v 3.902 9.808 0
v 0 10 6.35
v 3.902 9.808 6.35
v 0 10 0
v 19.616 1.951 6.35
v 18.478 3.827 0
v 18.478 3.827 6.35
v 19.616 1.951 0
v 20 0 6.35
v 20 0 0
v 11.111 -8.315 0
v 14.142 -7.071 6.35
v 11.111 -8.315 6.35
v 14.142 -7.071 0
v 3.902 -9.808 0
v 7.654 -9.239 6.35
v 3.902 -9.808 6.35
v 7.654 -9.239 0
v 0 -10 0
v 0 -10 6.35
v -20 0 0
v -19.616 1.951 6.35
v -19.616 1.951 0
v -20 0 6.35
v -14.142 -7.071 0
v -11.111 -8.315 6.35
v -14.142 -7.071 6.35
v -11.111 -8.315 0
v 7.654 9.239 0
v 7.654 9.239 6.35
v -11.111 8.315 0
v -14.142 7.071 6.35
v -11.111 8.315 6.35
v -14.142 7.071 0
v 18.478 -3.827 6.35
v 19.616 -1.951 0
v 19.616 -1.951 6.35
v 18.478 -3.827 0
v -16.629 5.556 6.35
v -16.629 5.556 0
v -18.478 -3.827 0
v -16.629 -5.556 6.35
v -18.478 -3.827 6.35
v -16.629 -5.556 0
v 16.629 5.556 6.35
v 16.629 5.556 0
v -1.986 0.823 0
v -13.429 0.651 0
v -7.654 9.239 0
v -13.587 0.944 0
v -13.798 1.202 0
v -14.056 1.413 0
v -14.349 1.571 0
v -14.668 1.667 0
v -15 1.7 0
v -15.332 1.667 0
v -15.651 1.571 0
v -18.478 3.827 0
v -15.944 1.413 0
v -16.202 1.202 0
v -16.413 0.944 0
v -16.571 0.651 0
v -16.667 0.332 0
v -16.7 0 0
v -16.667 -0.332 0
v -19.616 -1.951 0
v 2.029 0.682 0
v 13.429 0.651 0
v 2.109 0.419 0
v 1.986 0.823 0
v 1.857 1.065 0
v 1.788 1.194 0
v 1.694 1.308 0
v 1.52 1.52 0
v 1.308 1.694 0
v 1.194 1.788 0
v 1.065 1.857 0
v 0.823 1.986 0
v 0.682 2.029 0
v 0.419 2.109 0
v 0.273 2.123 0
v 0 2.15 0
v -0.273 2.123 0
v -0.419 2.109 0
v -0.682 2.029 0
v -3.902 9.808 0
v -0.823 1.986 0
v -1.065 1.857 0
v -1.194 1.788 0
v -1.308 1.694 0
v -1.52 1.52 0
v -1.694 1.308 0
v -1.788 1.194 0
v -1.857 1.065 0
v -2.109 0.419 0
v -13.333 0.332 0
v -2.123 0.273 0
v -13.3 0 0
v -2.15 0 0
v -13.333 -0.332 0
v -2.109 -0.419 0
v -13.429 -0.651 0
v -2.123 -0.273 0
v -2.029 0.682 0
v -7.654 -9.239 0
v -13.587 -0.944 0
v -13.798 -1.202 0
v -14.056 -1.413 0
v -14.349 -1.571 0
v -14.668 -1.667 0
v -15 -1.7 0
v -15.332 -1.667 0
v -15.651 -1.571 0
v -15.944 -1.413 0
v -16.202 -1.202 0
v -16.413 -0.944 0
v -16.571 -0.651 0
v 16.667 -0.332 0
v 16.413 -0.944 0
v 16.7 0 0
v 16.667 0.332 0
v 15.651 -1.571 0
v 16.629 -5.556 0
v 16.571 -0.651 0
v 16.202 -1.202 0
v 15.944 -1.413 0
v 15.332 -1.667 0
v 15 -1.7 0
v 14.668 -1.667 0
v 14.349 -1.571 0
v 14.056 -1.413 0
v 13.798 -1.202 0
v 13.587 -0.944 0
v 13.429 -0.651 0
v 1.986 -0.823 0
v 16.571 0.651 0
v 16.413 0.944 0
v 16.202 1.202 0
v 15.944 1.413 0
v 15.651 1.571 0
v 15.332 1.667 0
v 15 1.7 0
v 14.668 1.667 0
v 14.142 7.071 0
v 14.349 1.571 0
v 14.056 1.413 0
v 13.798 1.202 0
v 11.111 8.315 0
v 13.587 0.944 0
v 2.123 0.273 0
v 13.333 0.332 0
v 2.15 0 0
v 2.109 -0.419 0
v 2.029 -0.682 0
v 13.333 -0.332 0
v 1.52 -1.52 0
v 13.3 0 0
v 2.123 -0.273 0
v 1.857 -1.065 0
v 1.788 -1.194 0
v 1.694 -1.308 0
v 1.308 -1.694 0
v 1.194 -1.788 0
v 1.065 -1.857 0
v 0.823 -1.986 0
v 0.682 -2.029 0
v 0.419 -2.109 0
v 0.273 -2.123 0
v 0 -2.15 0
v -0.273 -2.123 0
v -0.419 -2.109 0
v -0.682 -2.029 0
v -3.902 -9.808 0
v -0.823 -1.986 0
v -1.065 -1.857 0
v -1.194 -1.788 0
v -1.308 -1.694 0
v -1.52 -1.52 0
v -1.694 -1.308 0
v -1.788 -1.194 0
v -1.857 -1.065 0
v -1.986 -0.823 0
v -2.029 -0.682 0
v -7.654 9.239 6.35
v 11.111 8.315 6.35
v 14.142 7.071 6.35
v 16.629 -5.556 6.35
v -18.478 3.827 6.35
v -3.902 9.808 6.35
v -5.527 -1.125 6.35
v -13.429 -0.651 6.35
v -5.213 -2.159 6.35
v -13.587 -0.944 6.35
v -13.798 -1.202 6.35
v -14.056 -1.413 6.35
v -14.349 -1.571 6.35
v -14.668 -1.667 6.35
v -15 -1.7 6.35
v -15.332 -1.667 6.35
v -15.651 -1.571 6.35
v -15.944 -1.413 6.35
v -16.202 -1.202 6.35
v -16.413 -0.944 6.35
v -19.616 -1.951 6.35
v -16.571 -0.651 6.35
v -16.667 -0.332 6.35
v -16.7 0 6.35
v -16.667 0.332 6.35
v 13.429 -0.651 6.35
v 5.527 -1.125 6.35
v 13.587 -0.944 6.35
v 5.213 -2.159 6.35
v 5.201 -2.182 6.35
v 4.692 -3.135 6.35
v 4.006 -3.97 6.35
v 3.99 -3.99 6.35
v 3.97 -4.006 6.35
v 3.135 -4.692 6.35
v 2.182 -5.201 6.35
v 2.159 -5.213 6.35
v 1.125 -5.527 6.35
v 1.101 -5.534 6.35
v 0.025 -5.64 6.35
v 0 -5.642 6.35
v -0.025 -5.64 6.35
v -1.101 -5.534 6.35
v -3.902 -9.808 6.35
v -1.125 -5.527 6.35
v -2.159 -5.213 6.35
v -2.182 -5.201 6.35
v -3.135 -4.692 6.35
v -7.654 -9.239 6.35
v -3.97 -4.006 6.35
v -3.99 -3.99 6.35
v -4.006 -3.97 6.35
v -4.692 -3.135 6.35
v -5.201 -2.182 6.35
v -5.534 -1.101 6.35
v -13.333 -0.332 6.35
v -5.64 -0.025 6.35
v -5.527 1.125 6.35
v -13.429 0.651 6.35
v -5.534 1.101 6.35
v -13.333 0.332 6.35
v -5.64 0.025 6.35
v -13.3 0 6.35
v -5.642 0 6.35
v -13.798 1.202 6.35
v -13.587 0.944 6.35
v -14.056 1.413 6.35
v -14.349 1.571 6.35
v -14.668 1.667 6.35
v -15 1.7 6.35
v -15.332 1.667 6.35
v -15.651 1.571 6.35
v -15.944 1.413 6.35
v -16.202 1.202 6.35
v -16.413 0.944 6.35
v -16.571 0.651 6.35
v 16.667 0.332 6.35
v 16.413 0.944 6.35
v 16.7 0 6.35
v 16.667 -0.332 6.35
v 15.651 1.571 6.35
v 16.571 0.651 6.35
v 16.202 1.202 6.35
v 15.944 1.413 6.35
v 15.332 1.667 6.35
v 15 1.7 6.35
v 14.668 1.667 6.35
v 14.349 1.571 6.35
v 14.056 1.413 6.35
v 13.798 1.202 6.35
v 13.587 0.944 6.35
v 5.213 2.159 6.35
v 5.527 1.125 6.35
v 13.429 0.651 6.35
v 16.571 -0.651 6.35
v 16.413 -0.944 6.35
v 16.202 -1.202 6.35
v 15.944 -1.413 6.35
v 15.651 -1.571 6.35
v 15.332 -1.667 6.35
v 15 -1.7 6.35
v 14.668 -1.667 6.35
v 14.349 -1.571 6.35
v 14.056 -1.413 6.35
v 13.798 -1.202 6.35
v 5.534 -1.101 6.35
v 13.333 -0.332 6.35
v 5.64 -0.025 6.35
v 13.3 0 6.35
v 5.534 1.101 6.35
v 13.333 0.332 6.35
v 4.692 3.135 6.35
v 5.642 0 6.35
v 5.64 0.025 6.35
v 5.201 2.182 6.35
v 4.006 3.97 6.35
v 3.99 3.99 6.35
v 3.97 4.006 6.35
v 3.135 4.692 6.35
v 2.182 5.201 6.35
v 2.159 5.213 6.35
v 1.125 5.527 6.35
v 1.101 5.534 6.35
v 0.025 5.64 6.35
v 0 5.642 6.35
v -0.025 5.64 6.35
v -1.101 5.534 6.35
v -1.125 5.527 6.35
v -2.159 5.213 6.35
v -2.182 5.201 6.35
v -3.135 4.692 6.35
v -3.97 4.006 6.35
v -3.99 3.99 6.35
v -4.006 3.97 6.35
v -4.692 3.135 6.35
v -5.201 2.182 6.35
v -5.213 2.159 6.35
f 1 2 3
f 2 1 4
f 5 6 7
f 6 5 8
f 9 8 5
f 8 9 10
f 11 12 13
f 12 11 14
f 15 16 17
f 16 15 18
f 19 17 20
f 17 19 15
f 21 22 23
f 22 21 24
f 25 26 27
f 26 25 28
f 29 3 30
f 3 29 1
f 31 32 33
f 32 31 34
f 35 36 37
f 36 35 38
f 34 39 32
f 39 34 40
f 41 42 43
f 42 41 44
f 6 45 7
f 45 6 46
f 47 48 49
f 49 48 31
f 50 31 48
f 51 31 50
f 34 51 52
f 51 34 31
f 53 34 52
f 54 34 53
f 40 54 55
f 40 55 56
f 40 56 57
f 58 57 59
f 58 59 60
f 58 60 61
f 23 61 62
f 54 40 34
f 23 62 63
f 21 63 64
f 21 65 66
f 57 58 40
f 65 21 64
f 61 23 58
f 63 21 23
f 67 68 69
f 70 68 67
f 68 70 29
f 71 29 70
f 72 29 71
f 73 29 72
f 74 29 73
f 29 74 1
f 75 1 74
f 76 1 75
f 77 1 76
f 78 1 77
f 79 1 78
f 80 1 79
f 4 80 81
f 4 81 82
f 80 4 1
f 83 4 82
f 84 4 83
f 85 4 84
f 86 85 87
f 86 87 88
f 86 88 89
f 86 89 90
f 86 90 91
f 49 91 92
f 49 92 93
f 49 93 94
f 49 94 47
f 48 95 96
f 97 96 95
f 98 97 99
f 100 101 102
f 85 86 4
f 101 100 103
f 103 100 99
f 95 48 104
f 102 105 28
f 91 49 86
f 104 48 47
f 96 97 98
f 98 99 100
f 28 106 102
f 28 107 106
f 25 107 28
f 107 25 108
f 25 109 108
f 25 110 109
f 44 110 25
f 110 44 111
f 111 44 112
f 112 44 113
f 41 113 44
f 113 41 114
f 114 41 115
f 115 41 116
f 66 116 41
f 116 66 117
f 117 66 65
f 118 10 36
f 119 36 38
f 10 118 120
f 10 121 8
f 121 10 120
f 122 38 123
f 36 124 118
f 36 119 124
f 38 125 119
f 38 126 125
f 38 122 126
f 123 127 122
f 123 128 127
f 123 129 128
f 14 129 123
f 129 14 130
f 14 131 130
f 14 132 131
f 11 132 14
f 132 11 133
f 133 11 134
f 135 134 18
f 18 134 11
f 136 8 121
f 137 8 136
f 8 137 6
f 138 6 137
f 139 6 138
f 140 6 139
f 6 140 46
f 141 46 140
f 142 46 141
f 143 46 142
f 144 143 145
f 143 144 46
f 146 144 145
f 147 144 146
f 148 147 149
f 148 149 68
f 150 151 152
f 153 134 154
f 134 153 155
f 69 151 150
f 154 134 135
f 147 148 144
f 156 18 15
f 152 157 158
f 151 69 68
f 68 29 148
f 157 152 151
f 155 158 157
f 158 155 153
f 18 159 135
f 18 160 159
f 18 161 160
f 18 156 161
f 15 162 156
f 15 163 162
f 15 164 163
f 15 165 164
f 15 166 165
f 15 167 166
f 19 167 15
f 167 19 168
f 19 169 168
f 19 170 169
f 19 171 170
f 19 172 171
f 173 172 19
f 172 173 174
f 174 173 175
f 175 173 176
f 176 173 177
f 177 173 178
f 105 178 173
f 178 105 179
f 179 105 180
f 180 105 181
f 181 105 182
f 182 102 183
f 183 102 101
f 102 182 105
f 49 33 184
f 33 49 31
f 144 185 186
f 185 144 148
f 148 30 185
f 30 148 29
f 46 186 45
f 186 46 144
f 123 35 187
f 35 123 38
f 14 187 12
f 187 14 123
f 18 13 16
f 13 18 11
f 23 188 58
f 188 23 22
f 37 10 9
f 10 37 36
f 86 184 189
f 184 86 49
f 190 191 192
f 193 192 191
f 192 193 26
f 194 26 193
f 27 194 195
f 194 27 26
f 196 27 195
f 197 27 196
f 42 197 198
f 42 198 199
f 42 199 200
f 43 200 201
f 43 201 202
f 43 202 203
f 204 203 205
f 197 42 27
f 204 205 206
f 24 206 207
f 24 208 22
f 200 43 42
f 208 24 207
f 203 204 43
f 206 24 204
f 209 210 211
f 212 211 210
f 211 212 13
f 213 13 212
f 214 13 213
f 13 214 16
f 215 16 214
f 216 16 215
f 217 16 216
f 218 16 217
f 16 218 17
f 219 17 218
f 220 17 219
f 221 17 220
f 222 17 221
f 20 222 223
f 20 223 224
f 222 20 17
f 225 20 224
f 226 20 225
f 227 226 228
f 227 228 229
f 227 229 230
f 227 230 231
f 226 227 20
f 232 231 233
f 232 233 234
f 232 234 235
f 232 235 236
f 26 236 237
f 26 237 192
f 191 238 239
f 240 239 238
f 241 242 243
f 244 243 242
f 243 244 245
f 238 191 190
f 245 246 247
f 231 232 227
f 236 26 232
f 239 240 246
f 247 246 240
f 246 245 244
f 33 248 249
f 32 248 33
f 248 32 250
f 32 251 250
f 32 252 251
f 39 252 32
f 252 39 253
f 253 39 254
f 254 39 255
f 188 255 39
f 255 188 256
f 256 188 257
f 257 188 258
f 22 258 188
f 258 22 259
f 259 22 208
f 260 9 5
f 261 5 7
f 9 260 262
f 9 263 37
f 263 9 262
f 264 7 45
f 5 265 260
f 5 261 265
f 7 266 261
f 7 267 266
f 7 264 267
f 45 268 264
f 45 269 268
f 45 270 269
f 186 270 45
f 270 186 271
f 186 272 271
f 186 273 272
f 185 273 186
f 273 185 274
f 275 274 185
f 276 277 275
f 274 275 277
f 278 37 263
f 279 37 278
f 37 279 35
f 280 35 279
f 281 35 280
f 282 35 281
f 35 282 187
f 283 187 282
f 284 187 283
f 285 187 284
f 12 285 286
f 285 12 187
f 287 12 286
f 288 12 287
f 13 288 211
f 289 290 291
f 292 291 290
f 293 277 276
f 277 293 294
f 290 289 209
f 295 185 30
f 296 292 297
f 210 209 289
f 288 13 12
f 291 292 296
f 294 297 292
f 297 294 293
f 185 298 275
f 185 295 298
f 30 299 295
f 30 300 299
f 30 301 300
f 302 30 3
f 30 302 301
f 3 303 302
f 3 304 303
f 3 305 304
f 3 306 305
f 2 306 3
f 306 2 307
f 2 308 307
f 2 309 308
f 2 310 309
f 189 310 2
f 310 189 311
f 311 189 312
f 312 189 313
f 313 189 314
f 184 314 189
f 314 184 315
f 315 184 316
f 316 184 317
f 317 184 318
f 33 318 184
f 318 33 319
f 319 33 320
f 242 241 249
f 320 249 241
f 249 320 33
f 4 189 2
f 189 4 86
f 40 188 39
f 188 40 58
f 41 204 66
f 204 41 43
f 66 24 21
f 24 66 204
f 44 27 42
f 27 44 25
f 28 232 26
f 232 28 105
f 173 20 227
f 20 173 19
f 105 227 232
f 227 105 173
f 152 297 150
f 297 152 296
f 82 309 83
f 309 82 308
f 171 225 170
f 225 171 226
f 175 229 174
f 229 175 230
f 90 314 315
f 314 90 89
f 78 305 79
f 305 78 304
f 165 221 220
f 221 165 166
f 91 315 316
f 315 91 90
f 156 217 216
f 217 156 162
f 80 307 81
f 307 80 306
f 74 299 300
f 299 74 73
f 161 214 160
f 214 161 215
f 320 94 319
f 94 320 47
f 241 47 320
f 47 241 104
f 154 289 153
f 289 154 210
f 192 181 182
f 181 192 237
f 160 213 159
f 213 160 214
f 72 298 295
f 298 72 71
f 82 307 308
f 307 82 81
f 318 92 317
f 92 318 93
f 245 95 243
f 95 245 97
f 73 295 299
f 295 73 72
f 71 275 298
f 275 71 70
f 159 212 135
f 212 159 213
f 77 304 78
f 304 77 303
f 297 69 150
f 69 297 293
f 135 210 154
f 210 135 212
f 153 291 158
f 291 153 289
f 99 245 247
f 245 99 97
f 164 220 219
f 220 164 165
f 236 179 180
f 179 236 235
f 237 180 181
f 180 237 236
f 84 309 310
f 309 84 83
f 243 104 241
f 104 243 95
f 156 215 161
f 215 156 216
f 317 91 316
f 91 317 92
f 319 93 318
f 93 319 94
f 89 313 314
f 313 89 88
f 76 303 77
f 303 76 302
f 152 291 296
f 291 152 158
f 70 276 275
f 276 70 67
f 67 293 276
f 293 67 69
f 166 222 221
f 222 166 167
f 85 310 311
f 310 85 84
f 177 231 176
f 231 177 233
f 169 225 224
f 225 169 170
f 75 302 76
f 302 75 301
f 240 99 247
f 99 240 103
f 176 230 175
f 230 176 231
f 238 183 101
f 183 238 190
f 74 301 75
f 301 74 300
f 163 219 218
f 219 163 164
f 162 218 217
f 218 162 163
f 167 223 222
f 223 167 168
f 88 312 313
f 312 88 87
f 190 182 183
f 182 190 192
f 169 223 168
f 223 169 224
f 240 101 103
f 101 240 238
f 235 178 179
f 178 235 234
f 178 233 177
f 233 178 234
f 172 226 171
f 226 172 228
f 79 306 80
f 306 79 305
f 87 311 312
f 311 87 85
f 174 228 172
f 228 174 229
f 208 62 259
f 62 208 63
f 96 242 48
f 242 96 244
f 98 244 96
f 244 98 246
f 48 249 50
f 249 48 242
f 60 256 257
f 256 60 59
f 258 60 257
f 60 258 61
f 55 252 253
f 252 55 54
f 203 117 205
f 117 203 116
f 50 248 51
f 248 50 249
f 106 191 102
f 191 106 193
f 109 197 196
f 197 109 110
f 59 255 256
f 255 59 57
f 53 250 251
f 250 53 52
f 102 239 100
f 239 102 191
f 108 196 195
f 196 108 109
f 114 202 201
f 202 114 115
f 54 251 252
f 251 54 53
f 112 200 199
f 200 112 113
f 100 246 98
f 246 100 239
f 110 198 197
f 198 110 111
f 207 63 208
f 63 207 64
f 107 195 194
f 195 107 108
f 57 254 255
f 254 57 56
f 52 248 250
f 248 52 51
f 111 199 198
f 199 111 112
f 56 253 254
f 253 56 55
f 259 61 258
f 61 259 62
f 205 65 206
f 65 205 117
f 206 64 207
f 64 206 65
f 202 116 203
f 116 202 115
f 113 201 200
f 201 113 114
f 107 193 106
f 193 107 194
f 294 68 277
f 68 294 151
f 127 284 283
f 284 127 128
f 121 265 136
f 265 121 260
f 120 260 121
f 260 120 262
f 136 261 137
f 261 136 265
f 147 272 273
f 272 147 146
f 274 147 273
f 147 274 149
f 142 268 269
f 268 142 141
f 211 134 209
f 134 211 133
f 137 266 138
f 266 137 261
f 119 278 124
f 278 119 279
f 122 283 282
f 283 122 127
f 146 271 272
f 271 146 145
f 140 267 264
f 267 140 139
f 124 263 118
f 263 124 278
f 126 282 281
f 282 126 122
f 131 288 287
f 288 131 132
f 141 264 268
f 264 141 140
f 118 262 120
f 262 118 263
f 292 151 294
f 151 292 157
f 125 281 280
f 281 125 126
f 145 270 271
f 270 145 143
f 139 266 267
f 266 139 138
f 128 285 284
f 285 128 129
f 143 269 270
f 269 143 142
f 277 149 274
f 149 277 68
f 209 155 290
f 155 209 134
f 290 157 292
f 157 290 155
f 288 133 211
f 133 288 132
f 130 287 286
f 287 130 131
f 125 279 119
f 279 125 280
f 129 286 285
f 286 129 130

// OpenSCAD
// file: OpenSampler_v5_CONFIG_v0p0.scad
in=25.4;
xs=20;

Lx=440; //was 590 in Opensampler V2,was 480 in Opensampler V3.03
Ly=285;	//was 380 in OpenSampler V2,was 315 in OpenSampler V3.03
Lz=240; // was 220 in Opensampler V2, was 200 in Opensampler V3.03
La=135; //length of moving part on z-axis, was 140 in Opensampler V3.03
LyPlate=169; // length of y-plate that z-axis moves on. was 169 in V3.10

nema17holespac=31;
nema17diagholespac=43.84;

xyarm=28;
zyarm=Lz+xs+6;

platethick=3.175;
backpanelthick=6.35;
frontpanelthick=6;
bottomthick=12.7;
belt_end_thick=4.8;

wheeloffset=12;
plateoffset=wheeloffset-10;

//distance from extrusion surface to bottom plate=2.2mm
// plates are about 2.8mm making plate surface 5mm of extrusion
//hole spacing for wheels: 40.64,60.64,80.64,100.64
// BETTER hole spacing for wheels: 40.0,60.0,80.0,100.0
// hole diam for fixed wheel:5mm, for eccentric: 7.14mm
// spacer block and acme block are 12mm thick.
// 125ml (100ml) bottle size: h=95mm, diam=52mm

// 60mm clearance for needle and spings etc.
// so height between bottom frame and bottom z-axis:
// trayplate thickness + bottle h + 60
// 13 + 108 + 60 = 188mm

// tallest bottle: 155, smallest bottle: 105
// minimum clearance: 10, spring action: 40
// vertical movement: 155-105+10+30=90


// FOR OpenSampler V4 
// more z-height, 155mm 16mm diam vials expected
// ordered vials of KIMAX 16*150mm, which are 155mm high with cap
// change y cart to have 6 mini wheels for Z-axis
// fit 3 trays of 5*8 (103*160mm, 19mm spacing, 4mm edge)
// main file
include <OpenSampler_v5_CONFIG_v0p0.scad>;
$fn=32;


module E1x1(len){
	translate([0,0,0])
	difference(){
		translate([-xs/2,-xs/2,0])
		cube([xs,xs,len]);
		for ( i = [0 : 3] ){
			rotate([0,0,i*90])
			translate([-xs/2-1,-xs/8,-1])
			cube([xs/4,xs/4,len+2]);
		}
		translate([0,0,-1])
		cylinder(r=2.5,h=len+2);
	}	
}

module E1x2(len){
	translate([0,-xs*1/2,0]){
		E1x1(len);
		translate([0,xs,0])
		E1x1(len);
	}
}

module E1x3(len){
	translate([0,-xs*1,0]){
		E1x1(len);
		translate([0,xs,0])
		E1x1(len);
		translate([0,xs*2,0])
		E1x1(len);
	}
}

module wheel(){
	difference(){
		cylinder(r=12,h=11,center=true,$fn=25);
		cylinder(r=2.5,h=12,center=true);
	}
}

module mini_wheel(){
	difference(){
		cylinder(r=7.65,h=10,center=true);
		cylinder(r=2.5,h=12,center=true);
	}
}

// stepper nema 17, with some extra space around
module stepper(){ 
	difference(){
		union(){
			translate([-21,-21,-40])	
				cube([42,42,40],center=false);
			cylinder(r=2.5,h=30,center=false);
			cylinder(r=12,h=4,center=true);
			translate([-15.5,-15.5,0])
				cylinder(r=1.5,h=10,center=false);
			translate([15.5,-15.5,0])
				cylinder(r=1.5,h=10,center=false);
			translate([15.5,15.5,0])
				cylinder(r=1.5,h=10,center=false);
			translate([-15.5,15.5,0])
				cylinder(r=1.5,h=10,center=false);

			translate([0,0,10])
				cylinder(r=8,h=15,center=false);				
		}
	}
}

// stepper nema 17, with TR8-2 rod
module z_stepper(len){ 
	difference(){
		union(){
			translate([-21,-21,-40])	
				cube([42,42,40],center=false);
			cylinder(r=2.5,h=30,center=false);
			cylinder(r=12,h=4,center=true);
			translate([-15.5,-15.5,0])
				cylinder(r=1.5,h=10,center=false);
			translate([15.5,-15.5,0])
				cylinder(r=1.5,h=10,center=false);
			translate([15.5,15.5,0])
				cylinder(r=1.5,h=10,center=false);
			translate([-15.5,15.5,0])
				cylinder(r=1.5,h=10,center=false);
			translate([0,0,0])
				cylinder(r=4,h=len,center=false);					
		}
	}
}


module stepper_holes(){ 
	difference(){
		union(){
			translate([-21.5,-21.5,-49])	
				cube([43,43,49],center=false);
			cylinder(r=2.5,h=70,center=true);
			cylinder(r=14,h=10,center=false);
			cylinder(r=6,h=35,center=false);
			translate([-15.5,-15.5,0])
				cylinder(r=2,h=80,center=true);
			translate([15.5,-15.5,0])
				cylinder(r=2,h=80,center=true);
			translate([15.5,15.5,0])
				cylinder(r=2,h=80,center=true);
			translate([-15.5,15.5,0])
				cylinder(r=2,h=80,center=true);
		
		}
	}
}

// Main plate for x-axis movement 4.8mm aluminum (3/16")
module x_plate_top(){
	difference(){
		union(){
			translate([-5,-37,0])
			cube([115,76,4.8]);

			translate([(104+51.5)/2-21,35-24,0])
			cube([42,42,4.8]);				
            
            // wheels are just for display
			translate([2,-30,-12])
			wheel();
			translate([54,-30,-12])
			wheel();
			translate([104,-30,-12])
			wheel();

			translate([2,30,-12])
			wheel();
			translate([49,30,-12])
			wheel();
			translate([104,30,-12])
			wheel();
		}
        // holes for adjustable wheels
		translate([2,-30,-1])
		cylinder(r=3.57,h=10);
		translate([54,-30,-1])
		cylinder(r=3.57,h=10);
		translate([104,-30,-1])
		cylinder(r=3.57,h=10);

        // holes for M5 thread for wheels
		translate([2,30,-1])
		cylinder(r=2.1,h=10);
		translate([49,30,-1])
		cylinder(r=2.1,h=10);
		translate([104,30,-1])
		cylinder(r=2.1,h=10);

        // holes for attachment y-arm
		translate([xyarm,0,-1]){
			translate([0,30,0])
			cylinder(r=2.5,h=10);
			translate([0,0,0])
			cylinder(r=2.5,h=10);
			translate([0,-25,0])
			cylinder(r=2.5,h=10);
		}
        // pocket for secure attachment of y-arm
		translate([xyarm,0,0])        
        translate([-10,-50,3.2])
        cube([20,100,10]);

        // holes for 20mm endstop switch
		translate([2,-3,-1]){
			translate([0,-4.75,0])
			cylinder(r=1.2,h=10);
			translate([0,4.75,0])
			cylinder(r=1.2,h=10);
		}
        // holes for stepper motor
        translate([(104+51.5)/2,32,4.8+0.1])
        rotate([0,180,0])
        stepper_holes();

	}
	
}



module y_plate_top(){
	difference(){
		union(){
			translate([-36,-32,0])
			cube([LyPlate,64,platethick]);
			translate([-30,-20,-12])
			wheel();
			translate([30,-26,-12])
			wheel();
			translate([-30,26,-12])
			wheel();
			translate([30,26,-12])
			wheel();

			translate([50,25.7,15])
			mini_wheel();
			translate([50,-25.7,15])
			mini_wheel();
			translate([-25,-25,0])
			cube([50,50,3]);
			translate([17,25.7,15])
			mini_wheel();
			translate([17,-25.7,15])
			mini_wheel();
			translate([-16,25.7,15])
			mini_wheel();
			translate([-16,-25.7,15])
			mini_wheel();



		}
		translate([60,0,-1])
		cylinder(r=2.5,h=10);

		translate([30,26,-1])
		cylinder(r=2.5,h=10);
		translate([30,-26,-1])
		cylinder(r=2.5,h=10);

		translate([-30,26,-1])
		cylinder(r=3.57,h=10);
		translate([-30,-20,-1])
		cylinder(r=3.57,h=10);


		translate([50,25.7,-1])
		cylinder(r=3.57,h=10);
		translate([50,-25.7,-1])
		cylinder(r=2.5,h=10);
		translate([17,25.7,-1])
		cylinder(r=3.57,h=10);
		translate([17,-25.7,-1])
		cylinder(r=2.5,h=10);
		translate([-16,25.7,-1])
		cylinder(r=3.57,h=10);
		translate([-16,-25.7,-1])
		cylinder(r=2.5,h=10);

		translate([LyPlate-36-10,-30,-1]){
			translate([-4.75,0,0])
			cylinder(r=1.2,h=10);
			translate([4.75,0,0])
			cylinder(r=1.2,h=10);
		}
 		translate([LyPlate-36,0,-1]){ 
 			translate([-15,-15,0])
			cylinder(r=2.1,h=10);
			translate([-15,15,0])
			cylinder(r=2.1,h=10);     
        }      


	}	


}
module y_plate_bottom(){
	difference(){
		union(){
			translate([35,0,0])
			cylinder(r=32,h=3);
			translate([35,-32,0])
			cube([32,32,3]);
		}
        // holes for M5 thread to attach to y_plate_top
		translate([+30,-26,-1])
		cylinder(r=2.1,h=10);
		translate([+30,26,-1])
		cylinder(r=2.1,h=10);

		translate([60,0,-1])
		cylinder(r=2.1,h=10);

        // cut not needed part off
		translate([0,-32,-1])
		cube([15,64,10]);

        //holes for stepper motor
        translate([36,0,-1])
        stepper_holes();
        
        // hole for cable carrier
        translate([59,-26,-1])
        cylinder(r=2.1,h=100);
	}	
}



module z_motorplate(){
	difference(){
		union(){
            translate([0,-5,0])
			cylinder(r=32,h=platethick);
			translate([-32,-(xs/2+plateoffset+platethick*2),0])
			cube([64,(xs/2+plateoffset+platethick*2)-5,platethick]);

			translate([-32,-18.4,-25])
			cube([64,platethick,25]);
		}
        translate([-35,21,-1])
        cube([70,50,platethick+2]);
        
        // for acme T8 stepper
 		translate([0,0,-1])
		cylinder(r=12,h=10);       

        //holes for 0 deg stepper
 		translate([nema17holespac/2,nema17holespac/2,-1])
		cylinder(r=1.8,h=10);
		translate([-nema17holespac/2,nema17holespac/2,-1])
		cylinder(r=1.8,h=10);       

		translate([-10,-17-10,-1])
		cylinder(r=2.5,h=10);
		translate([10,-17-10,-1])
		cylinder(r=2.5,h=10);

		translate([-50,-118.4,-5])
		cube([100,100,10]);
        
      //holes for connecting to y_plate
        translate([-15,-20,-15])
        rotate([-90,0,0])
        cylinder(r=2.5,h=100);
        translate([15,-20,-15])
        rotate([-90,0,0])
        cylinder(r=2.5,h=100);

	}

}

module belt_end_plate(){
    difference(){
            translate([-20,-10,0])
            cube([40,20,belt_end_thick]);
            //deep under belt
            translate([-10,0,-1])
            cylinder(r=2.55,h=10);
            translate([-10,0,1.3])
            cylinder(r=4.55,h=10);
            // normal
            translate([10,0,-1])
            cylinder(r=2.55,h=10);           
            translate([10,0,3.3])
            cylinder(r=4.55,h=10);   
            // belt clamp screws
            translate([0,5,-1])
            cylinder(r=2,h=10);           
            translate([0,5,3])
            cylinder(r=4.55,h=10);
            translate([0,-5,-1])
            cylinder(r=2,h=10);           
            translate([0,-5,3])
            cylinder(r=4.55,h=10);  
        
            //belt holes
            translate([-16.5,2,-1])
            cylinder(r=1.5,h=10);           
            translate([-16.5,-2,-1])
            cylinder(r=1.5,h=10);      
            translate([3.5,2,-1])
            cylinder(r=1.5,h=10);           
            translate([3.5,-2,-1])
            cylinder(r=1.5,h=10); 
            translate([-18,-2,-1])
            cube([3,4,10]);
            translate([2,-2,-1])
            cube([3,4,10]);
            
            translate([-16.5,-3.5,2.8])
            cube([20,7,10]);
        
    }
}

module belt_end_plate_x(){
    difference(){
            union(){
                translate([-20,-10,0])
                cube([40,20,belt_end_thick]);
                translate([0,10,0])
                cylinder(r=19.99,h=belt_end_thick);
            }
                 
            //deep under belt
            translate([-10,0,-1])
            cylinder(r=2.55,h=10);
            translate([-10,0,1.3])
            cylinder(r=4.55,h=10);
            // normal
            translate([10,0,-1])
            cylinder(r=2.55,h=10);           
            translate([10,0,3.3])
            cylinder(r=4.55,h=10);   
            // belt clamp screws
            translate([0,5,-1])
            cylinder(r=2,h=10);           
            translate([0,5,3])
            cylinder(r=4.55,h=10);
            translate([0,-5,-1])
            cylinder(r=2,h=10);           
            translate([0,-5,3])
            cylinder(r=4.55,h=10);  
        
            //belt holes
            translate([-16.5,2,-1])
            cylinder(r=1.5,h=10);           
            translate([-16.5,-2,-1])
            cylinder(r=1.5,h=10);      
            translate([3.5,2,-1])
            cylinder(r=1.5,h=10);           
            translate([3.5,-2,-1])
            cylinder(r=1.5,h=10); 
            translate([-18,-2,-1])
            cube([3,4,10]);
            translate([2,-2,-1])
            cube([3,4,10]);
            
            translate([-16.5,-3.5,2.8])
            cube([20,7,10]);
        
    }
}

module backpanel(){
	difference(){
		cube([Lx,backpanelthick,Lz-xs]);
		translate([xs+20,-1,xs+20+bottomthick])
		rotate([-90,0,0])
		cylinder(r=15,h=backpanelthick+2);

		translate([xs/2,-1,Lz-xs-20])
		rotate([-90,0,0])
		cylinder(r=2.55,h=backpanelthick+2);
		translate([xs/2,-1,xs+20])
		rotate([-90,0,0])
		cylinder(r=2.55,h=backpanelthick+2);

		translate([Lx-xs/2,-1,Lz-xs-20])
		rotate([-90,0,0])
		cylinder(r=2.55,h=backpanelthick+2);
		translate([Lx-xs/2,-1,xs+20])
		rotate([-90,0,0])
		cylinder(r=2.55,h=backpanelthick+2);

		translate([Lx/2,-1,xs/2])
		rotate([-90,0,0])
		cylinder(r=2.55,h=backpanelthick+2);
		
	}
}

module xcablecarrier(){
	translate([200,-xs,Lz-xs-80])
	cube([Lx-xs-200-2,xs+1, 6]);

}

module frontpanel(){
	difference(){
		translate([0,-xs*3-frontpanelthick,xs+bottomthick-2])
		cube([Lx,backpanelthick,Lz-xs*2-bottomthick+2]);

		translate([xs/2,-xs*3-frontpanelthick-1,xs+40])
		rotate([-90,0,0])
		cylinder(r=2.55,h=backpanelthick+2);
		translate([xs/2,-xs*3-frontpanelthick-1,Lz-xs-20])
		rotate([-90,0,0])
		cylinder(r=2.55,h=backpanelthick+2);

		translate([Lx-xs/2,-xs*3-frontpanelthick-1,xs+40])
		rotate([-90,0,0])
		cylinder(r=2.55,h=backpanelthick+2);
		translate([Lx-xs/2,-xs*3-frontpanelthick-1,Lz-xs-20])
		rotate([-90,0,0])
		cylinder(r=2.55,h=backpanelthick+2);
	}
}

module bottomplate(){
	difference(){
		translate([0,-Ly,xs])
		cube([Lx,Ly,bottomthick]);
		
		translate([-1,-xs*3,xs-1])
		cube([xs+1,3*xs+2,xs+2]);
		translate([Lx-xs,-xs*3,xs-1])
		cube([xs+1,3*xs+2,xs+2]);

		translate([xs/2,-Ly+xs*1.5,xs-1])
		cylinder(r=2.55,h=20);
		translate([Lx-xs/2,-Ly+xs*1.5,xs-1])
		cylinder(r=2.55,h=20);
		translate([Lx/2,-Ly+xs/2,xs-1])
		cylinder(r=2.55,h=20);

		translate([xs/2,-Ly/3,xs-1])
		cylinder(r=2.55,h=20);
		translate([Lx-xs/2,-Ly/3,xs-1])
		cylinder(r=2.55,h=20);

		translate([Lx/2,-xs/2,xs-1])
		cylinder(r=2.55,h=20);


		translate([-1,-xs*3-6.25,xs+bottomthick-2])
		cube([Lx+2,6.35,Lz]);

		translate([250,-xs*3-3.125,0]){
			translate([0,0,0])
			cylinder(r=2.55,h=100);
			translate([35,0,0])
			cylinder(r=2.55,h=100);
			translate([70,0,0])
			cylinder(r=2.55,h=100);
			translate([105,0,0])
			cylinder(r=2.55,h=100);
			translate([140,0,0])
			cylinder(r=2.55,h=100);
			translate([175,0,0])
			cylinder(r=2.55,h=100);
		}
	}
}

module arduino_mega_holes(){
	union(){
		cube([101,53,2]);
		
		translate([0.55*in,0.1*in,-50])
		cylinder(r=1.5,h=60);
		translate([0.6*in,2*in,-50])
		cylinder(r=1.5,h=60);

		translate([2.6*in,0.3*in,-50])
		cylinder(r=1.5,h=60);
		translate([2.6*in,1.4*in,-50])
		cylinder(r=1.5,h=60);

		translate([3.8*in,0.1*in,-50])
		cylinder(r=1.5,h=60);
		translate([3.55*in,2.0*in,-50])
		cylinder(r=1.5,h=60);
	}
}

module powersupply(){
	cube([130,32,50]);
}

module ramps(){
	union(){
		translate([-15,-8,0])
		cube([115,61,40]);
	}
}

module needle_mount_bottom(){
	difference(){
		union(){
			translate([-20,0,0])
			cube([40,32,9.5]);
	
		}
		translate([-21,18,5])
		cube([42,30,9.5]);	
	
		translate([-9,9,-1])
		cylinder(r=2.1,h=100);
		translate([9,9,-1])
		cylinder(r=2.1,h=100);
	
		translate([-10,24,-1])
		cylinder(r=2.55,h=100);
		translate([10,24,-1])
		cylinder(r=2.55,h=100);
		translate([-10,24,3.2])
		cylinder(r=4.75,h=100);
		translate([10,24,3.2])
		cylinder(r=4.75,h=100);
	
	
		translate([0,-1,10])
		rotate([-90,0,0])
		cylinder(r=3.5,h=3.5);
		
		
		translate([0,2.45,10])
		rotate([-90,0,0])
		cylinder(r=6.4,h=9.3+2.55,$fn=6);
	
		translate([0,14,10])
		rotate([-90,0,0])
		cylinder(r=4,h=3);
	
		translate([0,16,10])
		rotate([-90,0,0])
		cylinder(r=7,h=100);	



		translate([-15,-1,9.7])
		rotate([-90,0,0])
		cylinder(r=3.4,h=100);	
		translate([15,-1,9.7])
		rotate([-90,0,0])
		cylinder(r=3.4,h=100);
	}
}

module needle_mount_top(){
	difference(){
		union(){
			translate([-20,0,0])
			cube([40,18,9.5]);
	
		}
	
		translate([-9,9,-1])
		cylinder(r=2.5,h=100);
		translate([9,9,-1])
		cylinder(r=2.5,h=100);
	
		translate([-10,24,-1])
		cylinder(r=2.55,h=100);
		translate([10,24,-1])
		cylinder(r=2.55,h=100);
		translate([-10,24,3.2])
		cylinder(r=4.75,h=100);
		translate([10,24,3.2])
		cylinder(r=4.75,h=100);
	
	
		translate([0,-1,10])
		rotate([-90,0,0])
		cylinder(r=3.5,h=3.5);
		
		
		translate([0,2.45,10])
		rotate([-90,0,0])
		cylinder(r=6.4,h=9.3+2.55,$fn=6);
	
		translate([0,14,10])
		rotate([-90,0,0])
		cylinder(r=4,h=3);
	
		translate([0,16,10])
		rotate([-90,0,0])
		cylinder(r=7,h=100);	

		translate([-15,-1,9.7])
		rotate([-90,0,0])
		cylinder(r=3.4,h=100);	
		translate([15,-1,9.7])
		rotate([-90,0,0])
		cylinder(r=3.4,h=100);
	}
}

module spring_support_plate(){
    difference(){
        linear_extrude(height=12.7, convexity = 10)
        polygon(points=[[-20,-10],[20,-10],[20,-5],[16,-1],[16,1],[20,5],[20,20],
        [18,24],[12,24],[8,10],[-8,10],[-12,24],[-18,24],[-20,20],[-20,10],
        [-20,5],[-16,1],[-16,-1],[-20,-5]]);
       
        // slight oversized holes for 4mm brass vertical rod of spring plate
        translate([-15,20,-1])
        cylinder(r=2.05,h=100); 
        translate([15,20,-1])
        cylinder(r=2.05,h=100); 
        
        // M5 screw holes and countersinks
        translate([-10,0,-1])
        cylinder(r=2.5,h=100); 
        translate([10,0,-1])
        cylinder(r=2.5,h=100); 
        translate([-10,0,-1])
        cylinder(r=4.75,h=3); 
        translate([10,0,-1])
        cylinder(r=4.75,h=3); 
        
        translate([-21,-11,6.35])
        cube([42,21.01,100]);
       
        // optional center hole for too long trapezium rod on z-stepper motor
        //translate([0,0,-1])
        //cylinder(r=4.5,h=100);
    }   
}

module spring_support_plate_top(){
    difference(){
        translate([-20,-16,0])
        cube([40,16,12.7]);
        
        //center cut-out for sample tubing
        translate([-4,-17,-1])
        cube([8,8,100]);
        translate([0,-17+8,-1])
        cylinder(r=4,h=100); 
       
        // slight oversized holes for 4mm brass vertical rod of spring plate
        translate([-15,-10,-1])
        cylinder(r=2.05,h=100); 
        translate([15,-10,-1])
        cylinder(r=2.05,h=100); 
        
        // M5 screw holes and countersink
        translate([-10,-50,6.35])
        rotate([-90,0,0])
        cylinder(r=2.5,h=100); 
        translate([10,-50,6.35])
        rotate([-90,0,0])
        cylinder(r=2.5,h=100); 
        translate([-10,-17,6.35])
        rotate([-90,0,0])
        cylinder(r=4.75,h=3); 
        translate([10,-17,6.35])
        rotate([-90,0,0])
        cylinder(r=4.75,h=3); 
        
        

    }   
}
module spring_plate(){
    difference(){
        union(){
            translate([0,0,0])
            scale([1,0.5,1])
            cylinder(r=20,h=6.35);
        }
        translate([0,0,-1])
        cylinder(r1=1.6,r2=6,h=8); 
        
        translate([-15,0,-1])
        cylinder(r=1.7,h=100); 
        translate([15,0,-1])
        cylinder(r=1.7,h=100);
    }        
    
}

module end_stop_holder_old(){
    difference(){
        translate([0,-7,0])
        cube([32,14,5]);
        
        translate([4.5,0,-1])
        cylinder(r=2.55,h=10);
        translate([4.5,-2.55,-1])
        cube([4,5.1,10]);
        translate([8.5,0,-1])
        cylinder(r=2.55,h=10);       
    
        translate([23-4.75,0,-1])
        cylinder(r=1.7,h=10);    
        translate([23+4.75,0,-1])
        cylinder(r=1.7,h=10); 
        
        translate([23-4.75,0,-1])
        cylinder(r=3.5,h=4);    
        translate([23+4.75,0,-1])
        cylinder(r=3.5,h=4); 
    }
}

module end_stop_holder(){
    difference(){
        translate([0,-8,0])
        rounded_cube(28,16,5,3);
        
        translate([6,-2,-1])
        cylinder(r=2.55,h=10);
        translate([6-2.55,-2,-1])
        cube([5.1,4,10]);
        translate([6,2,-1])
        cylinder(r=2.55,h=10);       
    
        translate([23,-4.75,-1])
        cylinder(r=1.7,h=10);    
        translate([23,4.75,-1])
        cylinder(r=1.7,h=10); 
        
        translate([23,-4.75,-1])
        cylinder(r=2.8,h=4);    
        translate([23,4.75,-1])
        cylinder(r=2.8,h=4); 
    }
}


module solenoid_plate(){
    difference(){
        union(){
            cylinder(r=8.5,h=4.8);
        }
        translate([0,-5,-1])
        cylinder(r=2.1,h=10);
        translate([0,5,-1])
        cylinder(r=2.1,h=10);        
        
        translate([3/16*in,0,-1])
        cylinder(r=1.8,h=10);
        translate([-3/16*in,0,-1])
        cylinder(r=1.8,h=10);            

        translate([3/16*in,0,1.3])
        cylinder(r=3.2,h=4);
        translate([-3/16*in,0,1.3])
        cylinder(r=3.2,h=4);         
    }    
}

module rounded_cube(cx,cy,cz,cr){
    union(){
        translate([cr,0,0])
        cube([cx-cr*2,cy,cz]);	
        translate([0,cr,0])
        cube([cx,cy-cr*2,cz]);
        translate([cr,cr,0])
        cylinder(r=cr,h=cz);
        translate([cx-cr,cr,0])
        cylinder(r=cr,h=cz);
        translate([cr,cy-cr,0])
        cylinder(r=cr,h=cz);
        translate([cx-cr,cy-cr,0])
        cylinder(r=cr,h=cz);
    }   
}

//________________________________________________________________________________
// --------------------individual parts----------------------------------------
//
//$fn=128;
//projection(cut = true){
   // solenoid_plate();
  //  end_stop_holder();

//}
//needle_mount_top();

//translate([36,32,-1])
//
//x_plate_top();

//translate([36,32,-1])
//y_plate_top();
//y_plate_bottom();

//y_plate_bottom();


// TOP CUT Z_MOTORPLATE
//translate([32,18.4,-2.5])
//z_motorplate();
//}

// SIDE CUT Z_MOTORPLATE
//translate([0,0,1])
//rotate([-90,0,0])
//translate([32,18.4,-3])
//z_motorplate();
//}
//
//translate([20,10,-4])
//spring_support_plate();
//
//translate([20,10,-10])
//rotate([180,0,0])
spring_plate();
//
//translate([20,16,-1])
//spring_support_plate_top();
//}


// _________backpanel__________________
//translate([0,40,0])
//translate([0,180,0])
//rotate([90,0,0])
//difference(){
//	backpanel();
//	translate([-1,10,0])
//	xcablecarrier();
//	translate([+1,10,0])
//	xcablecarrier();
//
//	translate([xs+20,-5,xs+bottomthick+70])
//	rotate([90,0,0])
//	translate([100,53,0])
//	rotate([0,0,180])
//	arduino_mega_holes();
//}
//
//}

//_________________Bottomplate____________________
//translate([0,Ly,-xs])
//bottomplate();


//_____________frontpanel______________________
//translate([0,Lz-xs*2-bottomthick+2,0])
//rotate([90,0,0])
//translate([0,3*xs+6,-xs-bottomthick+2])
//frontpanel();


//
//translate([-241,132,16])
//rotate([0,90,0])
//			difference(){
//				translate([xyarm-xs/2-2,-100,zyarm])
//				rotate([0,-90,0])
//				y_plate_bottom();
//
//				translate([xyarm-xs/2-9,-100,zyarm+35+1])
//				rotate([0,90,0])
//				//rotate([0,0,45])
//				stepper_holes();
//			}



	//motorplate_on_top();

//				//translate([36,32,-1])
//				rotate([0,0,0])
//				difference(){
//				y_plate_top();
//
//				translate([45,0,-1])
//				rotate([0,0,45])
//				stepper_holes();
//			}

//
//translate([5,37,0])
//	difference(){
//		x_plate_top();
//		translate([(104+51.5)/2,32,3+2])
//		rotate([0,180,0])
//		stepper_holes();
//	}

//belt_end_plate_x();
